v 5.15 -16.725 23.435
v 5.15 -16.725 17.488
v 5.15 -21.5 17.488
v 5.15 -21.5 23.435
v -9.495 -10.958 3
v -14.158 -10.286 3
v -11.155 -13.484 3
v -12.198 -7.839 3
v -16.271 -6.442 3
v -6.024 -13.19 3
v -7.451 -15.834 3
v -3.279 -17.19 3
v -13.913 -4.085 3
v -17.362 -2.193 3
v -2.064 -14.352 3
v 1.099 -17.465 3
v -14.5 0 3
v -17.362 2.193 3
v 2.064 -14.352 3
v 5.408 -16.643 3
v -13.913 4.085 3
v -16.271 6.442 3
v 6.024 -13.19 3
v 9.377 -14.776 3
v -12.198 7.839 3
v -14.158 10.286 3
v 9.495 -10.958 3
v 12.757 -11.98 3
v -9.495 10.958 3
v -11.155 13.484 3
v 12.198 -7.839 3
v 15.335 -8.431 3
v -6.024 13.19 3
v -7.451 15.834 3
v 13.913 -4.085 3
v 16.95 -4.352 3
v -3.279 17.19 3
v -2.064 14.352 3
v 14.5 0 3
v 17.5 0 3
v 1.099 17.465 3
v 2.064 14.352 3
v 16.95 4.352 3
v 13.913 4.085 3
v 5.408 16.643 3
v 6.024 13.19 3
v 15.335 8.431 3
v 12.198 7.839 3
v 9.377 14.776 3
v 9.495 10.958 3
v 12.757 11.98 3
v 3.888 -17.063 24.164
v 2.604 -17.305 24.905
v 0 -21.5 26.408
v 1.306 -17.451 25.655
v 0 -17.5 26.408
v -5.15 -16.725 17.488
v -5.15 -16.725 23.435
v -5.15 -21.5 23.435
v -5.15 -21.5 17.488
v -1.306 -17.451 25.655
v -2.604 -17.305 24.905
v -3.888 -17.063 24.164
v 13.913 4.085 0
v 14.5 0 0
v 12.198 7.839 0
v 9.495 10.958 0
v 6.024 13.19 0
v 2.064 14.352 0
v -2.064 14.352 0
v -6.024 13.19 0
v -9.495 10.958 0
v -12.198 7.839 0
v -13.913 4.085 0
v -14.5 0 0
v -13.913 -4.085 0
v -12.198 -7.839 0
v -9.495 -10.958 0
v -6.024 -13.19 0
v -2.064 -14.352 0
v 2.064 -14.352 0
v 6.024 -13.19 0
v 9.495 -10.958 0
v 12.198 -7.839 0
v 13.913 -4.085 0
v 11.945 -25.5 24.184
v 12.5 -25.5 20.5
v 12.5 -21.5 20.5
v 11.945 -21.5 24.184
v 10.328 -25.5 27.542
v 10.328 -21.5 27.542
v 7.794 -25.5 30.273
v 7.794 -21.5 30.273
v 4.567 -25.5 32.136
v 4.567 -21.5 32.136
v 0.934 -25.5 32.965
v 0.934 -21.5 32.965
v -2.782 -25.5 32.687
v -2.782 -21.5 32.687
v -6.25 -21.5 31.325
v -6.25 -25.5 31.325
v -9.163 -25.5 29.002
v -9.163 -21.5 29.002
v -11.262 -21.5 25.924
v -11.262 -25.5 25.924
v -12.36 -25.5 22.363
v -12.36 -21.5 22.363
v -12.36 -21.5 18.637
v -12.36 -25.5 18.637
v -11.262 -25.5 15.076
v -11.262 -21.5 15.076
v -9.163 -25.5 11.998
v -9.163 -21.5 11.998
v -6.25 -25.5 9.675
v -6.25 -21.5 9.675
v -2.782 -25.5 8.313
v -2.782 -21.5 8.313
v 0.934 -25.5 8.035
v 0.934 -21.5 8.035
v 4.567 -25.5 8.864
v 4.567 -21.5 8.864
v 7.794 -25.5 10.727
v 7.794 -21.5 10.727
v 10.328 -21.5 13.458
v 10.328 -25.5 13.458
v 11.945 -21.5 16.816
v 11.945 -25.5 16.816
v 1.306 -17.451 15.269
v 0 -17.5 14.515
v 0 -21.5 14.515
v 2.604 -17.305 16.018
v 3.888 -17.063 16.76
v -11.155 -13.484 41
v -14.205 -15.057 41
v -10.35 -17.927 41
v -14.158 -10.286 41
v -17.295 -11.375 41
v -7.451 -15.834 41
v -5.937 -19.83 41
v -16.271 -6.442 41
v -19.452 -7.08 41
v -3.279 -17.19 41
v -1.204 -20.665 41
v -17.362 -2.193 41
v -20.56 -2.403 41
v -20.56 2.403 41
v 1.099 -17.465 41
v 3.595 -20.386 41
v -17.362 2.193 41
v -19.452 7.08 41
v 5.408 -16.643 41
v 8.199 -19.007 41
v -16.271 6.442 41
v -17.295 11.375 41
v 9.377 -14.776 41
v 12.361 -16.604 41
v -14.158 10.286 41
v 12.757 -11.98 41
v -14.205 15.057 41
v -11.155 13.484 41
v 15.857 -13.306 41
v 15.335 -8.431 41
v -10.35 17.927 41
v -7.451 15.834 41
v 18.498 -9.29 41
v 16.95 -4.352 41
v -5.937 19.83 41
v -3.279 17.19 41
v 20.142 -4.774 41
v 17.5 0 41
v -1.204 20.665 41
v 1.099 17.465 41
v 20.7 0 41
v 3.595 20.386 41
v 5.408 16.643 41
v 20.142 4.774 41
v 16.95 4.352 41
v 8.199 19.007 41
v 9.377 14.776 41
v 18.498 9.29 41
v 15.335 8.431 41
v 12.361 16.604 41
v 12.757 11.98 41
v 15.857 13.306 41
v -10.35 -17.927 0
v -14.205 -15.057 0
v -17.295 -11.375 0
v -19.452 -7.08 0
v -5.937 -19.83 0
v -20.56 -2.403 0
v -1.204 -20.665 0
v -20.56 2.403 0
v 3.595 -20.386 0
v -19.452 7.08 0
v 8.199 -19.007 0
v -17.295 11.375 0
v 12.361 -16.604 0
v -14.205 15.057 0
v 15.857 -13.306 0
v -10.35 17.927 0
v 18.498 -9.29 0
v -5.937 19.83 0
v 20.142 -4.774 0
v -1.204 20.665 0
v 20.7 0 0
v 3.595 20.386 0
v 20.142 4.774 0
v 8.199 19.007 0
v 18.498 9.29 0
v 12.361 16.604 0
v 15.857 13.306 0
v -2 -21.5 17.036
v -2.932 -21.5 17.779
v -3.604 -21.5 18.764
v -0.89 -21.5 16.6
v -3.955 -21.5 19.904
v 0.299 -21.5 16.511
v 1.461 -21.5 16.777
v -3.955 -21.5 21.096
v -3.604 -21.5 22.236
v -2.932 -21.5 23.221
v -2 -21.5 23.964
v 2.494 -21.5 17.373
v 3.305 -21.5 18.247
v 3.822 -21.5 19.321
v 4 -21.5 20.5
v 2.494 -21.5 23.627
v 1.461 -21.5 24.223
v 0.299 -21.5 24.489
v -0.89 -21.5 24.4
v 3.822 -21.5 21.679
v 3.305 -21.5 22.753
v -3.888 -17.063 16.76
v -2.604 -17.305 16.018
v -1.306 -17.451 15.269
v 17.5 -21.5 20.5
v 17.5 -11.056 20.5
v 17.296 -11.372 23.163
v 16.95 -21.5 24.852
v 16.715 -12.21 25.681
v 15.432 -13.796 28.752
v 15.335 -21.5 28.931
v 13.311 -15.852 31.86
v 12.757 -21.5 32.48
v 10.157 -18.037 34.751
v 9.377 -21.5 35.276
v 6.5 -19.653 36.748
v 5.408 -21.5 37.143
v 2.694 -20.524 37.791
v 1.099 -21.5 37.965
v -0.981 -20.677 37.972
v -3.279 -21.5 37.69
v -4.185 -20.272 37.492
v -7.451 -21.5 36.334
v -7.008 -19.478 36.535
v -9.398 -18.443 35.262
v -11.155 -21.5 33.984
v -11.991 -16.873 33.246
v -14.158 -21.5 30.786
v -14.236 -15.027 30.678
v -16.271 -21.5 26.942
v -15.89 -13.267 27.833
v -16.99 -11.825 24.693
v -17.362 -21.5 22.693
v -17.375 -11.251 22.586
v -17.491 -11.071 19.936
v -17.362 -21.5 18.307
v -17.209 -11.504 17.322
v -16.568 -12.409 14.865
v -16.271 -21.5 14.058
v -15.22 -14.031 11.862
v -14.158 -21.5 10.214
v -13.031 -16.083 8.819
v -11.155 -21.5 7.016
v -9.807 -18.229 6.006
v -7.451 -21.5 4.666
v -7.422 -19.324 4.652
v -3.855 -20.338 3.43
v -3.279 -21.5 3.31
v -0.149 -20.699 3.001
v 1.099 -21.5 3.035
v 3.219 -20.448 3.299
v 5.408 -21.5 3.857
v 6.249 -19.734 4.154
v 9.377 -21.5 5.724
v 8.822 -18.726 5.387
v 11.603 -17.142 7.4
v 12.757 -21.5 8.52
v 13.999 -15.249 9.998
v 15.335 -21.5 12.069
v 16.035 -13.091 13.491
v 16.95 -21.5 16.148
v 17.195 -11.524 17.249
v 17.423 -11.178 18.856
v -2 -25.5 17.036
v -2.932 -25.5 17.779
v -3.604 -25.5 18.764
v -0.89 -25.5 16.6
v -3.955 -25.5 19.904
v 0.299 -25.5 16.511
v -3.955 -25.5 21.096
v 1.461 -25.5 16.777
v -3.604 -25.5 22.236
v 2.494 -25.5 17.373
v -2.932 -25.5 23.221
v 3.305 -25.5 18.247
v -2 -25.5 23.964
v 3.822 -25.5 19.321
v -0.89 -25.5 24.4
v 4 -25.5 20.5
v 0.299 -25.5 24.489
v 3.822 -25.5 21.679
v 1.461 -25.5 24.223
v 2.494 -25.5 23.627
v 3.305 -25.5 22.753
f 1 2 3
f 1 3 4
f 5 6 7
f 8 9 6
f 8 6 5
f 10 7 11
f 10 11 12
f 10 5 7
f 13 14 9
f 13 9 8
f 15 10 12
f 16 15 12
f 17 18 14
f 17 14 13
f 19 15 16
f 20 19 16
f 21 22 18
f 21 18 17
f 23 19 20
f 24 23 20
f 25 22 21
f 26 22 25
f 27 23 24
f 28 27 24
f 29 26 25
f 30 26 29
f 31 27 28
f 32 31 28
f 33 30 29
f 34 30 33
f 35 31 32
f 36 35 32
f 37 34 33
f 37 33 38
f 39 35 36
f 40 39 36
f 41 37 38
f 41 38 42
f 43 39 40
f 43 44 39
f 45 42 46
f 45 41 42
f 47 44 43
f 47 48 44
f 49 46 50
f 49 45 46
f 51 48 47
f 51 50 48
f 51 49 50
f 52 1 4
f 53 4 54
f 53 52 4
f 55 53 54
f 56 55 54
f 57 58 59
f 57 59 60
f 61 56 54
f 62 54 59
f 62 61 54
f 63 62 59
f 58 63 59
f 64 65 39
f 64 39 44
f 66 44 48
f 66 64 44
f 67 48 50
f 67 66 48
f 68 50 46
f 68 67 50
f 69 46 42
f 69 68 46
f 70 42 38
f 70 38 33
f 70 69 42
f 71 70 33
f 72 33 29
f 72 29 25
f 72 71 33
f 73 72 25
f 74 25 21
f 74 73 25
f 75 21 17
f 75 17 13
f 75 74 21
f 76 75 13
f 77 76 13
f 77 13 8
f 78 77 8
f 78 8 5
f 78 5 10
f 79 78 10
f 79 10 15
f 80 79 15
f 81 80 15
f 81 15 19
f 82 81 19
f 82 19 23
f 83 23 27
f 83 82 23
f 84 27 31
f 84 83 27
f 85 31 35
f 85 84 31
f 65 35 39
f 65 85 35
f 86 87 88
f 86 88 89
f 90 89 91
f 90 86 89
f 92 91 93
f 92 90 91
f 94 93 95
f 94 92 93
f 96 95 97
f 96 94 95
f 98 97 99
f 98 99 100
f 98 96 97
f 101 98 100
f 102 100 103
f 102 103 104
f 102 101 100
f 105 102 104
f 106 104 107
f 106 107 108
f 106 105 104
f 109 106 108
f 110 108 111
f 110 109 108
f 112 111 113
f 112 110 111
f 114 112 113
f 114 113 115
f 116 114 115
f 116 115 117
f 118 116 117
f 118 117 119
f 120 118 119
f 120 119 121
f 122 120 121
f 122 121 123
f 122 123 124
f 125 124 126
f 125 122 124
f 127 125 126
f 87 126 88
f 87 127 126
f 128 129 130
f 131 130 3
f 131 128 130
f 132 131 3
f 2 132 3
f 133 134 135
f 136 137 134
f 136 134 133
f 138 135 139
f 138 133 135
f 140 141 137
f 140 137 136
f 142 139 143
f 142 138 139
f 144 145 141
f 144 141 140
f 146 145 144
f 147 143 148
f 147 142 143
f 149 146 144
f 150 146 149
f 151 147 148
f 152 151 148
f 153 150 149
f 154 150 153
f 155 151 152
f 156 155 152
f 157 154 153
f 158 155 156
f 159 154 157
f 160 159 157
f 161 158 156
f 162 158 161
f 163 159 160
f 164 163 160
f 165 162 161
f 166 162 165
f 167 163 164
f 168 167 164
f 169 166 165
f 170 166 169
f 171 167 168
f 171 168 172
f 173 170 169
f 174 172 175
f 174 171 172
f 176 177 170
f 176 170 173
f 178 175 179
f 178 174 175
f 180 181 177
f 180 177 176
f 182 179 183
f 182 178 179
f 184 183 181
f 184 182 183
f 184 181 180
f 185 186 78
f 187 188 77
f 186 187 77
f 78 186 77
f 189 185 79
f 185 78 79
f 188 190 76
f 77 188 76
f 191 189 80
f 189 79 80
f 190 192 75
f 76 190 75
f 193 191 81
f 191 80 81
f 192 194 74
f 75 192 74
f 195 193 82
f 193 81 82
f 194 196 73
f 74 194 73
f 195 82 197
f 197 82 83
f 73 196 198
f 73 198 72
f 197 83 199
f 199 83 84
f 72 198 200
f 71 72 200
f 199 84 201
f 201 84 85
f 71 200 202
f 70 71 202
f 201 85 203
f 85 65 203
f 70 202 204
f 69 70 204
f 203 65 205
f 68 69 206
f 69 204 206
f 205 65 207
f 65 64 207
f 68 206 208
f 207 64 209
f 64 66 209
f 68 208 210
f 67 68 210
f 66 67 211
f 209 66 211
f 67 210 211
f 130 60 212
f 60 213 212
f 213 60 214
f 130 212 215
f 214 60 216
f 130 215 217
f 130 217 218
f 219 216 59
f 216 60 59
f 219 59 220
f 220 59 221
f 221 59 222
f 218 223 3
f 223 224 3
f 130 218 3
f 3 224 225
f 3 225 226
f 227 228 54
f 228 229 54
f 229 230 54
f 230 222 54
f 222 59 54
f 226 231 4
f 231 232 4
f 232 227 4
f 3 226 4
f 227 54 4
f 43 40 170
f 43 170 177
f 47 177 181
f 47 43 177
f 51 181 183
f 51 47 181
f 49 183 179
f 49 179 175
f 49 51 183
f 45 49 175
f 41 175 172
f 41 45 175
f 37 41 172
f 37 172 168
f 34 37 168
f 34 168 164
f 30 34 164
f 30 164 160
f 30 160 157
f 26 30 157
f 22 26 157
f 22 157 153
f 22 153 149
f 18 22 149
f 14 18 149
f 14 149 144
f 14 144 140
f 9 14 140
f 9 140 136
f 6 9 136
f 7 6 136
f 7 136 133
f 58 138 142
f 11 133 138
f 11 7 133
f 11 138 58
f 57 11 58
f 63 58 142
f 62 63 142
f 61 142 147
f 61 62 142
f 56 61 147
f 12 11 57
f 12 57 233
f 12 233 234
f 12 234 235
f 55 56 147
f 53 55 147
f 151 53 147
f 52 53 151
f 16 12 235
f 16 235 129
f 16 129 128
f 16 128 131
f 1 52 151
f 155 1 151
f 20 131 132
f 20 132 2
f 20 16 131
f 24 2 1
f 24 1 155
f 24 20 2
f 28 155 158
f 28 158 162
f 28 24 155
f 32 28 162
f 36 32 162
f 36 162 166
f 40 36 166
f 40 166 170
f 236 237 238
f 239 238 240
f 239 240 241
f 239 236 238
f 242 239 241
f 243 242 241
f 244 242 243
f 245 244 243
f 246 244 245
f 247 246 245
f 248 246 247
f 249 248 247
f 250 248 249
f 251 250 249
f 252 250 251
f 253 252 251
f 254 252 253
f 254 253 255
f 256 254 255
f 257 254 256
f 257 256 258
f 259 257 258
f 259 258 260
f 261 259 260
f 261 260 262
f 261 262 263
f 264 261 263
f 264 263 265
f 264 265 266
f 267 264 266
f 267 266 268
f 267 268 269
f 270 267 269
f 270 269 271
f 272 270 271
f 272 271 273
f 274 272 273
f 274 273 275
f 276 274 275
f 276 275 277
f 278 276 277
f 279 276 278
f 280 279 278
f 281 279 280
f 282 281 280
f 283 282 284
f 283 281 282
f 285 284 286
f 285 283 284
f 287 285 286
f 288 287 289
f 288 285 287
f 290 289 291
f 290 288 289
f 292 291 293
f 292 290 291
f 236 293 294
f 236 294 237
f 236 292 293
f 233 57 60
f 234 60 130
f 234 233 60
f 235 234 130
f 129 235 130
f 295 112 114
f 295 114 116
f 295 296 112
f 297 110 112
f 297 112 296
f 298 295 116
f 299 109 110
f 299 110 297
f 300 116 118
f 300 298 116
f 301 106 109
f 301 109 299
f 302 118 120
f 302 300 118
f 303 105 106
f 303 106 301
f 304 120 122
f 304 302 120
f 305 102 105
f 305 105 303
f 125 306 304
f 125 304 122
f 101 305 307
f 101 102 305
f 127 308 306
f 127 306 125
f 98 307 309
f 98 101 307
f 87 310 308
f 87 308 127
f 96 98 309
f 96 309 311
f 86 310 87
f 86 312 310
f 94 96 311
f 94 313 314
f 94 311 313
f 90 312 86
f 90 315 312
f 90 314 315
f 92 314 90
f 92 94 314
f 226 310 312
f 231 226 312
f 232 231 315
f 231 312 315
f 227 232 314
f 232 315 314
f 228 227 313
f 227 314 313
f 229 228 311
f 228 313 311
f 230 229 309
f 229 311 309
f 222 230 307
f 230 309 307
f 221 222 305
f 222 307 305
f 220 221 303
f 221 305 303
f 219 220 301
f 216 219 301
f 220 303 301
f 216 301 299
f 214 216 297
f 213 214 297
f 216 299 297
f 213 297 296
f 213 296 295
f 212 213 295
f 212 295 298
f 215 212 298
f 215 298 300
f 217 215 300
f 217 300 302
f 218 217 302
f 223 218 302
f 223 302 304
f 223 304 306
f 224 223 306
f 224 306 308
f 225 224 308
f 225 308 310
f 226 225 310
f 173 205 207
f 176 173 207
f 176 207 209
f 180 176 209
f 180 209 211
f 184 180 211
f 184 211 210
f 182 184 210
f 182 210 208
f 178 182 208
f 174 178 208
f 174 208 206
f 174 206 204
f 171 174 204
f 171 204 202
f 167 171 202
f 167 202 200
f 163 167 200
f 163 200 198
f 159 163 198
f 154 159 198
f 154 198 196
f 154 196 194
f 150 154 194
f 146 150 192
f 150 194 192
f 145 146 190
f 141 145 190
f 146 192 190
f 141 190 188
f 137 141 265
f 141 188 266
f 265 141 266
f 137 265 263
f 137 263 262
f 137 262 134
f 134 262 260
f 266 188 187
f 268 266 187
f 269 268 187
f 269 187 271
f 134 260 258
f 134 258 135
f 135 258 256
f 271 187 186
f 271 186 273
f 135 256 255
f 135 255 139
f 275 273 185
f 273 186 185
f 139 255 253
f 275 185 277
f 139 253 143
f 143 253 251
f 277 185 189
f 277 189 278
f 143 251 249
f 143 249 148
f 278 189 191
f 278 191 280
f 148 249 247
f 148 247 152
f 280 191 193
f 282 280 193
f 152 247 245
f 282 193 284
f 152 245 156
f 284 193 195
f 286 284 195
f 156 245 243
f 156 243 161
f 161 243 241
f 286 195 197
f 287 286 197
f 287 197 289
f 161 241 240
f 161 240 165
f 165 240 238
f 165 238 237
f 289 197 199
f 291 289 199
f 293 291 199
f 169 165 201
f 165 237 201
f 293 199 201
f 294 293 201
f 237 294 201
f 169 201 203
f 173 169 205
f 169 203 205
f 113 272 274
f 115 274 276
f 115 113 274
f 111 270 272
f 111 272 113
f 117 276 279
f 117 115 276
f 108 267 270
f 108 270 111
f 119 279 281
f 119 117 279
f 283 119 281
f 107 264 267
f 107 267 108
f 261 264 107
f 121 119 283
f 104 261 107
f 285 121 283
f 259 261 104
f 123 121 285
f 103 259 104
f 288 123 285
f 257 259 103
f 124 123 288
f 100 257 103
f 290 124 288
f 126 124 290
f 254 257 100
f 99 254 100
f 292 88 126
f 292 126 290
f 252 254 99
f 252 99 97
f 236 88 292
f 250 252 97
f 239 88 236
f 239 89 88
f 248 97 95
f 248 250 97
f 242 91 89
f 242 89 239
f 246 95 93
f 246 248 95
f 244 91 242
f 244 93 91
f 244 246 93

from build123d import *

# Parameters (mm, degrees)
F0_R     = 20.7
F0_R_2   = 17.5
F1_DEPTH = 41
F0_R_3   = 14.5
F2_DEPTH = 3
F4_R     = 17.5
F4_R_2   = 12.5
F4_R_3   = 4
F6_DEPTH = 4
F7_DEPTH = 25
F9_DEPTH = 21.5


with BuildPart() as f1:
    # F0 (on Top) → F1 (new body)
    with BuildSketch(Plane.XY):
        Circle(F0_R)
        Circle(F0_R_2, mode=Mode.SUBTRACT)
    extrude(amount=F1_DEPTH)

    # F0 (on Top) → F2 (join)
    with BuildSketch(Plane.XY):
        Circle(F0_R_2)
        Circle(F0_R_3, mode=Mode.SUBTRACT)
    extrude(amount=F2_DEPTH)

    # F4 (on offset) → F5 (join, up to the next surface of F1)
    with BuildSketch(Plane.XZ.offset(25.5)):
        with Locations((0, 20.5)):
            Circle(F4_R)
        with Locations((0, 20.5)):
            Circle(F4_R_2, mode=Mode.SUBTRACT)
        with Locations((0, 20.5)):
            Circle(F4_R_2)
        with Locations((0, 20.5)):
            Circle(F4_R_3, mode=Mode.SUBTRACT)
    extrude(until=Until.NEXT, dir=(0, 1, 0))

    # F4 (on offset) → F6 (cut)
    with BuildSketch(Plane.XZ.offset(25.5)):
        with Locations((0, 20.5)):
            Circle(F4_R)
        with Locations((0, 20.5)):
            Circle(F4_R_2, mode=Mode.SUBTRACT)
    extrude(amount=-F6_DEPTH, mode=Mode.SUBTRACT)

    # F4 (on offset) → F7 (cut)
    with BuildSketch(Plane.XZ.offset(25.5)):
        with Locations((0, 20.5)):
            Circle(F4_R_3)
    extrude(amount=-F7_DEPTH, mode=Mode.SUBTRACT)

    # F8 (on Front) → F9 (cut, through all)
    with BuildSketch(Plane.XZ):
        Polygon((5.15, 23.43514415), (0, 26.4084980363), (-5.15, 23.43514415), (-5.15, 17.4884363773), (0, 14.515082491), (5.15, 17.4884363773), align=None)
    extrude(amount=F9_DEPTH, mode=Mode.SUBTRACT)


solid = f1.part
